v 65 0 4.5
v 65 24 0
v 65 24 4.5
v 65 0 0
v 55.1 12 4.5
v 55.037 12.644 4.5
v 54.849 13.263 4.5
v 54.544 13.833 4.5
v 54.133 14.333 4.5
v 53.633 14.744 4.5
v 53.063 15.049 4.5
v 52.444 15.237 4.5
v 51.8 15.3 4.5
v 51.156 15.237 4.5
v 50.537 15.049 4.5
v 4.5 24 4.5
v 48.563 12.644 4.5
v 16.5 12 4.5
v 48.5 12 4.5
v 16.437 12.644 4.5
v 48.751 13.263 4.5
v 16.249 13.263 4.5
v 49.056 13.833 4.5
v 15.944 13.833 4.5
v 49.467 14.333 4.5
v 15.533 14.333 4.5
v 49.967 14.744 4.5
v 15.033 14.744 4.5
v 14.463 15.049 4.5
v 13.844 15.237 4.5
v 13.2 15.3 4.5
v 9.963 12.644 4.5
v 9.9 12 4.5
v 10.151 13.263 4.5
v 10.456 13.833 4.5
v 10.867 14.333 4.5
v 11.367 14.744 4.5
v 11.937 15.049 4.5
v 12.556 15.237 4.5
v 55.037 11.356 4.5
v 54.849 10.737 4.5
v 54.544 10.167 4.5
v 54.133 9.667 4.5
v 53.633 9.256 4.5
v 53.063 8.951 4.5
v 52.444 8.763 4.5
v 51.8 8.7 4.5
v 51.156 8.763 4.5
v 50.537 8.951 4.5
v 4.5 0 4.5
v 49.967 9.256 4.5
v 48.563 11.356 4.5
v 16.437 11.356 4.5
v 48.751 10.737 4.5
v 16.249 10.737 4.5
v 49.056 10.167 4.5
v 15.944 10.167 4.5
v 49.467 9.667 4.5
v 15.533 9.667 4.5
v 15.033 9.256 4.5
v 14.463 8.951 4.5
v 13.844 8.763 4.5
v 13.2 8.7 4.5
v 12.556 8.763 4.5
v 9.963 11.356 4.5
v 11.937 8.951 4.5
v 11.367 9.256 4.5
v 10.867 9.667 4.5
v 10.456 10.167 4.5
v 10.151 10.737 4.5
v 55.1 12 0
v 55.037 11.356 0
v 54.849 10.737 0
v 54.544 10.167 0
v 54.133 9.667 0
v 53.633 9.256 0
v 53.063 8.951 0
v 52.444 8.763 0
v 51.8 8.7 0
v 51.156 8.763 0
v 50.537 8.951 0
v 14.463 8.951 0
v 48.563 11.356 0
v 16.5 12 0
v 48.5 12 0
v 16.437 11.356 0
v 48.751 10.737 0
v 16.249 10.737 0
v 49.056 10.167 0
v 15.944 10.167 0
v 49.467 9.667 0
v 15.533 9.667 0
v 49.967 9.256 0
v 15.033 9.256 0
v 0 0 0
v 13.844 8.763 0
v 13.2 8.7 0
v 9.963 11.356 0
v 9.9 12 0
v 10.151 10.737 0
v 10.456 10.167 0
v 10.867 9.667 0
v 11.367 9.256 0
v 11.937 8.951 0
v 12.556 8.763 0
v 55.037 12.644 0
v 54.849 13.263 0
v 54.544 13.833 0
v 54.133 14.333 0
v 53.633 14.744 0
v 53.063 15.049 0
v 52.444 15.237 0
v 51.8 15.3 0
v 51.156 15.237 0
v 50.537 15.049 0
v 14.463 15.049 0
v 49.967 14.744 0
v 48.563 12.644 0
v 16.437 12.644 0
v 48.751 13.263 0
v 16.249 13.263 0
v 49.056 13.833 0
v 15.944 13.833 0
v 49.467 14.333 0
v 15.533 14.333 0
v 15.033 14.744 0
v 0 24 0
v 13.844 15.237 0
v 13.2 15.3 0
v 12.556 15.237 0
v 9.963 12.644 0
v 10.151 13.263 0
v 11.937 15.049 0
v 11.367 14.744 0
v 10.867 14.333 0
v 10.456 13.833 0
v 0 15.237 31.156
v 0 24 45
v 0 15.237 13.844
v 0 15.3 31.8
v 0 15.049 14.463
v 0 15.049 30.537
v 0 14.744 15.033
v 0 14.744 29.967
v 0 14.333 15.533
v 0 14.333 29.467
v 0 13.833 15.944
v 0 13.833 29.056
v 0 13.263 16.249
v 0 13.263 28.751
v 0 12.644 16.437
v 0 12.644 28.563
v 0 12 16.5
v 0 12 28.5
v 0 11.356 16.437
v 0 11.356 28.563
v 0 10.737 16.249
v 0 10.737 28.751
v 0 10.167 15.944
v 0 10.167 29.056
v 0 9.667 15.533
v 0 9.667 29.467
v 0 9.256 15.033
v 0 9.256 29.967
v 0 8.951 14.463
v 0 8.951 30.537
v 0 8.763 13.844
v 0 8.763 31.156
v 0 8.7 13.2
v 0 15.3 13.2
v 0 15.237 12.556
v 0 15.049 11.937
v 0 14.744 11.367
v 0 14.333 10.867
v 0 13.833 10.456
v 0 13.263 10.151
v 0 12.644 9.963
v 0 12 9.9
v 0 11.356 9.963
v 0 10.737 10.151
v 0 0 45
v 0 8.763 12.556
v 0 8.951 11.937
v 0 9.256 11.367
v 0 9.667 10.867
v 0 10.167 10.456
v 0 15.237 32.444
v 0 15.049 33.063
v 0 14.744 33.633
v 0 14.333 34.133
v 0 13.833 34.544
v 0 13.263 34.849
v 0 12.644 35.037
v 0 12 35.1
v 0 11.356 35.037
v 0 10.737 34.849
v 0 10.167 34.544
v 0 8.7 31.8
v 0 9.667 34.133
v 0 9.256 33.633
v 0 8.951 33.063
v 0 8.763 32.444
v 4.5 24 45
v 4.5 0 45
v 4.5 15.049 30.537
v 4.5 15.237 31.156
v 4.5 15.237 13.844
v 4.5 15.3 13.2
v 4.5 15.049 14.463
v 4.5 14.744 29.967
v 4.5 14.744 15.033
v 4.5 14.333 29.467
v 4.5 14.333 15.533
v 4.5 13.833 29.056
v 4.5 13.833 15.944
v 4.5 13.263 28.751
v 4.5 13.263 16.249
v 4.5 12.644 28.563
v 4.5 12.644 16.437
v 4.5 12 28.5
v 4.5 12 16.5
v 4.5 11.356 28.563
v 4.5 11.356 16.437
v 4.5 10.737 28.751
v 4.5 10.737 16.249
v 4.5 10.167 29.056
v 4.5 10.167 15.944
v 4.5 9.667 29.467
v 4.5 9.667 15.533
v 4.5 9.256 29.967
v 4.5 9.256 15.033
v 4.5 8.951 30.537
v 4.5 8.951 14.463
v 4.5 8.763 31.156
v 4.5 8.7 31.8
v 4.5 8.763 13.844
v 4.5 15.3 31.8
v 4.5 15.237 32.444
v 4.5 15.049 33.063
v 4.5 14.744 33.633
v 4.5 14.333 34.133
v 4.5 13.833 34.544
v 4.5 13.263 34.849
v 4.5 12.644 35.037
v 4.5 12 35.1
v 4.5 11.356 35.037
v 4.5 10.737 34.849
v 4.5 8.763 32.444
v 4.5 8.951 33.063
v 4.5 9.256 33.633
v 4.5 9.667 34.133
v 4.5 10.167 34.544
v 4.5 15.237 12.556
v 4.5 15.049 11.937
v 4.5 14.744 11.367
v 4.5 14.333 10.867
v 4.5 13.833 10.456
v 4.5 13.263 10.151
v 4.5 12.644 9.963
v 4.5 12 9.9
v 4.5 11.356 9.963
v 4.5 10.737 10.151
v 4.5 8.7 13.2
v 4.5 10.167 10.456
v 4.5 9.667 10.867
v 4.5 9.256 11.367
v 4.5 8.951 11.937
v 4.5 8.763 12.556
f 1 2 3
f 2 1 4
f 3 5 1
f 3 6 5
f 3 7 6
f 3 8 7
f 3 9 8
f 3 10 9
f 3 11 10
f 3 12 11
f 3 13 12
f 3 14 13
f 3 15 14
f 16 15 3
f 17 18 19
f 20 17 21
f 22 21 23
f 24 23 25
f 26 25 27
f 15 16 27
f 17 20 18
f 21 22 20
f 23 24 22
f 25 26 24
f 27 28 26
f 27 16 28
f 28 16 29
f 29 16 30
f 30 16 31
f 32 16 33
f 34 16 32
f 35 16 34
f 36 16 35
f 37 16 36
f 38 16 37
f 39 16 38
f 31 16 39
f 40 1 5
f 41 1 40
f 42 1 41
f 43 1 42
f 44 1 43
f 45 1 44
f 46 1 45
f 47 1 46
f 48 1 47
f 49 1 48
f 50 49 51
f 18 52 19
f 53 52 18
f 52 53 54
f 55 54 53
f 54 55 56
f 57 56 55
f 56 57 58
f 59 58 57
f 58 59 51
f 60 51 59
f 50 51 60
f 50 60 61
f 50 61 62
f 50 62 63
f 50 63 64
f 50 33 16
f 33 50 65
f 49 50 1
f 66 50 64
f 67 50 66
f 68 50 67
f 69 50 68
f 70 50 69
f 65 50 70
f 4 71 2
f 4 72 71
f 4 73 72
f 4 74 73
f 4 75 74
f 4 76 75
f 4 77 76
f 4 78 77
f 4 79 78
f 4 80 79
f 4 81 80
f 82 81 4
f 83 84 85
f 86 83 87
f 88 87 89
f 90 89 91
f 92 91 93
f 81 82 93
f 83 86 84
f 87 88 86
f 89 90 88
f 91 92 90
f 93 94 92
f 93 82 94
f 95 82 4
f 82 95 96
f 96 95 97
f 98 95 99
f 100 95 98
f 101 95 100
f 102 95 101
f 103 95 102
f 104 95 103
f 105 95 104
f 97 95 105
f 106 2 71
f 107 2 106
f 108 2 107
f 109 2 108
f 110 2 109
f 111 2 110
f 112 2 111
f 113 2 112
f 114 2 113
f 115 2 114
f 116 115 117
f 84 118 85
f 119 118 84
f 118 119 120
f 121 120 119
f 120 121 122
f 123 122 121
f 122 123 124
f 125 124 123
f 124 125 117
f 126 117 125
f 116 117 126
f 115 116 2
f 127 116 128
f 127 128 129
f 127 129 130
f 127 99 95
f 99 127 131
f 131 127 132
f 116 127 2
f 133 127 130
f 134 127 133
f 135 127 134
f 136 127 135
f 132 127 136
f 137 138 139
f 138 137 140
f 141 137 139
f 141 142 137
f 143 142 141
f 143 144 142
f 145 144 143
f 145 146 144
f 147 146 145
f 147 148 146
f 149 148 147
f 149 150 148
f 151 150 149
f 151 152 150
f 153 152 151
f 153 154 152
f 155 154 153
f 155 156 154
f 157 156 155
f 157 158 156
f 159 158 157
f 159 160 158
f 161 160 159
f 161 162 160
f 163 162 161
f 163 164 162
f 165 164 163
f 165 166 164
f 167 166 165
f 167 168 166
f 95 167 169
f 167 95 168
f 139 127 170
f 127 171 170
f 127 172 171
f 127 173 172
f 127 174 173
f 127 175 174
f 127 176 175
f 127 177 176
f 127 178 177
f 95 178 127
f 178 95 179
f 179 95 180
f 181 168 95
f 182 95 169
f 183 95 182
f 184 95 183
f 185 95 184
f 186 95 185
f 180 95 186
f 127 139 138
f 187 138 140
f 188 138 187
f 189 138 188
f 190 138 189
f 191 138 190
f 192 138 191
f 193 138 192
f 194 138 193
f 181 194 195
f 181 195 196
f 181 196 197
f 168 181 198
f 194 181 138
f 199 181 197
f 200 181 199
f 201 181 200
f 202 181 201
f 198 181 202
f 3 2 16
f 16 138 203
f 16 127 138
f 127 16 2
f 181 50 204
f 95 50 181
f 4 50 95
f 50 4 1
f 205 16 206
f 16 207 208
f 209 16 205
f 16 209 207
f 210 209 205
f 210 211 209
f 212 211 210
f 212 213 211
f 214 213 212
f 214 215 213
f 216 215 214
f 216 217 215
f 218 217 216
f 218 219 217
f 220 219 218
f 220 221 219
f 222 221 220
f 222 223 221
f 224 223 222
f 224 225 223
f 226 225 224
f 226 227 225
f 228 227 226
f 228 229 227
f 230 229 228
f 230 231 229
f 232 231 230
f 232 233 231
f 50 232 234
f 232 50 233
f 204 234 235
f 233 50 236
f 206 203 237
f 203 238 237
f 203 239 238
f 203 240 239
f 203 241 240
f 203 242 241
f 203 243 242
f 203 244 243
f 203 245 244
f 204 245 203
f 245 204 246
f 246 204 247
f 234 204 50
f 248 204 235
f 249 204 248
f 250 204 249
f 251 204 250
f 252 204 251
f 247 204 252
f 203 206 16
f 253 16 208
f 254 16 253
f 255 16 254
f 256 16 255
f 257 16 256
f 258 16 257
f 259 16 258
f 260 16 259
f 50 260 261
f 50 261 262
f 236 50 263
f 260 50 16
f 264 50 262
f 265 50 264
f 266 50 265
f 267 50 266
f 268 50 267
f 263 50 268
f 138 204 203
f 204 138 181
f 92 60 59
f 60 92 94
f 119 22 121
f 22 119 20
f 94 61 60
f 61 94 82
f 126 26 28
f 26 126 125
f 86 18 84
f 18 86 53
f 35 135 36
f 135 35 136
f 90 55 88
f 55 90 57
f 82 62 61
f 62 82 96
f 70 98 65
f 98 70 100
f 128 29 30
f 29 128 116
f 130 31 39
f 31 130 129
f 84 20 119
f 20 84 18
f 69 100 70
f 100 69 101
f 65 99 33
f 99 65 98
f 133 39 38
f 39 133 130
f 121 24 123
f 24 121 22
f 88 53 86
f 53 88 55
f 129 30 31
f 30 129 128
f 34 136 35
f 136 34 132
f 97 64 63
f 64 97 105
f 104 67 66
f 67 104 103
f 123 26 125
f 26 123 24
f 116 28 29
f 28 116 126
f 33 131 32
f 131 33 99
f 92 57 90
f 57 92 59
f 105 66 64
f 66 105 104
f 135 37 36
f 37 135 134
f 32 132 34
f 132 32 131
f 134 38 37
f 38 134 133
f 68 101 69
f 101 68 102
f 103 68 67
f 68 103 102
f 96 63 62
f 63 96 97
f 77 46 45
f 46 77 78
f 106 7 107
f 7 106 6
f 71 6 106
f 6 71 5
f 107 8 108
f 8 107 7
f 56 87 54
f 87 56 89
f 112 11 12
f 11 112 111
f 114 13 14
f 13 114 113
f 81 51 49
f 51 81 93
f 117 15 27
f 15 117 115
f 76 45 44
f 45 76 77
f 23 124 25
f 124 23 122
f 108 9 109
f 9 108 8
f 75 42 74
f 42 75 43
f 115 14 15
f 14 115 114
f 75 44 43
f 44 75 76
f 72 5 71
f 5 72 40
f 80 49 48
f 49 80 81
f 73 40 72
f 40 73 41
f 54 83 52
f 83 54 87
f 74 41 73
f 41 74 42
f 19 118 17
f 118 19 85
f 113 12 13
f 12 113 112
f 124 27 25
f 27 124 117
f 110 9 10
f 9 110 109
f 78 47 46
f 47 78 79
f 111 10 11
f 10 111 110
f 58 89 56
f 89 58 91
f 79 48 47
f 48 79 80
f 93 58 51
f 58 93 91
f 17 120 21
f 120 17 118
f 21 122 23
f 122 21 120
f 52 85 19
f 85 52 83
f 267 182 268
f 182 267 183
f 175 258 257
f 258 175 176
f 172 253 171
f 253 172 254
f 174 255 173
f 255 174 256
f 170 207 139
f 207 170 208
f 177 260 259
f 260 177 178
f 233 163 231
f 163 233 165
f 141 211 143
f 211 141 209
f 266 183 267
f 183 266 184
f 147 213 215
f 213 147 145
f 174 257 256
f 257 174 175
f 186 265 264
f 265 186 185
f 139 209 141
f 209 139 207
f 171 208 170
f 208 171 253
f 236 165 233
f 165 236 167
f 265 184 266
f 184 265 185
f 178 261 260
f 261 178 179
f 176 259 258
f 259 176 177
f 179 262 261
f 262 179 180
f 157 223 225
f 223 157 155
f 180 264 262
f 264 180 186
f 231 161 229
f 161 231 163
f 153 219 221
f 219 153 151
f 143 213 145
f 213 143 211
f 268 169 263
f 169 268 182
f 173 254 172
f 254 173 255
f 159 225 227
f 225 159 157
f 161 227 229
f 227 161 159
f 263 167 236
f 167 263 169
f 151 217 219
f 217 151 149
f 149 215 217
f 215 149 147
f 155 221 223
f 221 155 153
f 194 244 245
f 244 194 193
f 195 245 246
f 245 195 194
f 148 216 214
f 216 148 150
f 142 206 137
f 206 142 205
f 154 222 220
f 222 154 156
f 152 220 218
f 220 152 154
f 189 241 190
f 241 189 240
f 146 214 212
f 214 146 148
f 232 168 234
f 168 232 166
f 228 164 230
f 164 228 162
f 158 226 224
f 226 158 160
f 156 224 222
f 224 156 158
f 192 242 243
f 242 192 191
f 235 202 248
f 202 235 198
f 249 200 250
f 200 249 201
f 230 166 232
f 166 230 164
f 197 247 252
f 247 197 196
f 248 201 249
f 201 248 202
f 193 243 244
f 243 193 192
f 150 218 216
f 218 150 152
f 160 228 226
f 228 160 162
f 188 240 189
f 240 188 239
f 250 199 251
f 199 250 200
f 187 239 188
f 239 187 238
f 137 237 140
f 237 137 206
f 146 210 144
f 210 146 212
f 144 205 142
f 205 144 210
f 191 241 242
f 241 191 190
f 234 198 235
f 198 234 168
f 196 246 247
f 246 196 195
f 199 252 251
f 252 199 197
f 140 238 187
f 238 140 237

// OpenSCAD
$fn = 32;

// ----------------------------------------------------------------------
// L-bracket: 65 x 24 x 45 mm
// ----------------------------------------------------------------------

// --- parameters (mm) ---
base_len = 65;            // horizontal leg, X
upright_h = 45;           // vertical leg, Z
flange_w = 24;            // bracket depth, Y
mat_t = 4.5;              // plate thickness
hole_d = 6.6;             // clearance for M6

module hole_z(px, py) {
  translate([px, py, -0.5]) cylinder(h = mat_t + 1, d = hole_d);
}
module hole_x(pz, py) {
  translate([-0.5, py, pz]) rotate([0, 90, 0]) cylinder(h = mat_t + 1, d = hole_d);
}

difference() {
  union() {
    /* horizontal leg */
    cube([base_len, flange_w, mat_t]);
    /* vertical leg, overlapping the corner block */
    cube([mat_t, flange_w, upright_h]);
  }
  hole_z(13.2, 12);
  hole_z(51.8, 12);
  hole_x(13.2, 12);
  hole_x(31.8, 12);
}
